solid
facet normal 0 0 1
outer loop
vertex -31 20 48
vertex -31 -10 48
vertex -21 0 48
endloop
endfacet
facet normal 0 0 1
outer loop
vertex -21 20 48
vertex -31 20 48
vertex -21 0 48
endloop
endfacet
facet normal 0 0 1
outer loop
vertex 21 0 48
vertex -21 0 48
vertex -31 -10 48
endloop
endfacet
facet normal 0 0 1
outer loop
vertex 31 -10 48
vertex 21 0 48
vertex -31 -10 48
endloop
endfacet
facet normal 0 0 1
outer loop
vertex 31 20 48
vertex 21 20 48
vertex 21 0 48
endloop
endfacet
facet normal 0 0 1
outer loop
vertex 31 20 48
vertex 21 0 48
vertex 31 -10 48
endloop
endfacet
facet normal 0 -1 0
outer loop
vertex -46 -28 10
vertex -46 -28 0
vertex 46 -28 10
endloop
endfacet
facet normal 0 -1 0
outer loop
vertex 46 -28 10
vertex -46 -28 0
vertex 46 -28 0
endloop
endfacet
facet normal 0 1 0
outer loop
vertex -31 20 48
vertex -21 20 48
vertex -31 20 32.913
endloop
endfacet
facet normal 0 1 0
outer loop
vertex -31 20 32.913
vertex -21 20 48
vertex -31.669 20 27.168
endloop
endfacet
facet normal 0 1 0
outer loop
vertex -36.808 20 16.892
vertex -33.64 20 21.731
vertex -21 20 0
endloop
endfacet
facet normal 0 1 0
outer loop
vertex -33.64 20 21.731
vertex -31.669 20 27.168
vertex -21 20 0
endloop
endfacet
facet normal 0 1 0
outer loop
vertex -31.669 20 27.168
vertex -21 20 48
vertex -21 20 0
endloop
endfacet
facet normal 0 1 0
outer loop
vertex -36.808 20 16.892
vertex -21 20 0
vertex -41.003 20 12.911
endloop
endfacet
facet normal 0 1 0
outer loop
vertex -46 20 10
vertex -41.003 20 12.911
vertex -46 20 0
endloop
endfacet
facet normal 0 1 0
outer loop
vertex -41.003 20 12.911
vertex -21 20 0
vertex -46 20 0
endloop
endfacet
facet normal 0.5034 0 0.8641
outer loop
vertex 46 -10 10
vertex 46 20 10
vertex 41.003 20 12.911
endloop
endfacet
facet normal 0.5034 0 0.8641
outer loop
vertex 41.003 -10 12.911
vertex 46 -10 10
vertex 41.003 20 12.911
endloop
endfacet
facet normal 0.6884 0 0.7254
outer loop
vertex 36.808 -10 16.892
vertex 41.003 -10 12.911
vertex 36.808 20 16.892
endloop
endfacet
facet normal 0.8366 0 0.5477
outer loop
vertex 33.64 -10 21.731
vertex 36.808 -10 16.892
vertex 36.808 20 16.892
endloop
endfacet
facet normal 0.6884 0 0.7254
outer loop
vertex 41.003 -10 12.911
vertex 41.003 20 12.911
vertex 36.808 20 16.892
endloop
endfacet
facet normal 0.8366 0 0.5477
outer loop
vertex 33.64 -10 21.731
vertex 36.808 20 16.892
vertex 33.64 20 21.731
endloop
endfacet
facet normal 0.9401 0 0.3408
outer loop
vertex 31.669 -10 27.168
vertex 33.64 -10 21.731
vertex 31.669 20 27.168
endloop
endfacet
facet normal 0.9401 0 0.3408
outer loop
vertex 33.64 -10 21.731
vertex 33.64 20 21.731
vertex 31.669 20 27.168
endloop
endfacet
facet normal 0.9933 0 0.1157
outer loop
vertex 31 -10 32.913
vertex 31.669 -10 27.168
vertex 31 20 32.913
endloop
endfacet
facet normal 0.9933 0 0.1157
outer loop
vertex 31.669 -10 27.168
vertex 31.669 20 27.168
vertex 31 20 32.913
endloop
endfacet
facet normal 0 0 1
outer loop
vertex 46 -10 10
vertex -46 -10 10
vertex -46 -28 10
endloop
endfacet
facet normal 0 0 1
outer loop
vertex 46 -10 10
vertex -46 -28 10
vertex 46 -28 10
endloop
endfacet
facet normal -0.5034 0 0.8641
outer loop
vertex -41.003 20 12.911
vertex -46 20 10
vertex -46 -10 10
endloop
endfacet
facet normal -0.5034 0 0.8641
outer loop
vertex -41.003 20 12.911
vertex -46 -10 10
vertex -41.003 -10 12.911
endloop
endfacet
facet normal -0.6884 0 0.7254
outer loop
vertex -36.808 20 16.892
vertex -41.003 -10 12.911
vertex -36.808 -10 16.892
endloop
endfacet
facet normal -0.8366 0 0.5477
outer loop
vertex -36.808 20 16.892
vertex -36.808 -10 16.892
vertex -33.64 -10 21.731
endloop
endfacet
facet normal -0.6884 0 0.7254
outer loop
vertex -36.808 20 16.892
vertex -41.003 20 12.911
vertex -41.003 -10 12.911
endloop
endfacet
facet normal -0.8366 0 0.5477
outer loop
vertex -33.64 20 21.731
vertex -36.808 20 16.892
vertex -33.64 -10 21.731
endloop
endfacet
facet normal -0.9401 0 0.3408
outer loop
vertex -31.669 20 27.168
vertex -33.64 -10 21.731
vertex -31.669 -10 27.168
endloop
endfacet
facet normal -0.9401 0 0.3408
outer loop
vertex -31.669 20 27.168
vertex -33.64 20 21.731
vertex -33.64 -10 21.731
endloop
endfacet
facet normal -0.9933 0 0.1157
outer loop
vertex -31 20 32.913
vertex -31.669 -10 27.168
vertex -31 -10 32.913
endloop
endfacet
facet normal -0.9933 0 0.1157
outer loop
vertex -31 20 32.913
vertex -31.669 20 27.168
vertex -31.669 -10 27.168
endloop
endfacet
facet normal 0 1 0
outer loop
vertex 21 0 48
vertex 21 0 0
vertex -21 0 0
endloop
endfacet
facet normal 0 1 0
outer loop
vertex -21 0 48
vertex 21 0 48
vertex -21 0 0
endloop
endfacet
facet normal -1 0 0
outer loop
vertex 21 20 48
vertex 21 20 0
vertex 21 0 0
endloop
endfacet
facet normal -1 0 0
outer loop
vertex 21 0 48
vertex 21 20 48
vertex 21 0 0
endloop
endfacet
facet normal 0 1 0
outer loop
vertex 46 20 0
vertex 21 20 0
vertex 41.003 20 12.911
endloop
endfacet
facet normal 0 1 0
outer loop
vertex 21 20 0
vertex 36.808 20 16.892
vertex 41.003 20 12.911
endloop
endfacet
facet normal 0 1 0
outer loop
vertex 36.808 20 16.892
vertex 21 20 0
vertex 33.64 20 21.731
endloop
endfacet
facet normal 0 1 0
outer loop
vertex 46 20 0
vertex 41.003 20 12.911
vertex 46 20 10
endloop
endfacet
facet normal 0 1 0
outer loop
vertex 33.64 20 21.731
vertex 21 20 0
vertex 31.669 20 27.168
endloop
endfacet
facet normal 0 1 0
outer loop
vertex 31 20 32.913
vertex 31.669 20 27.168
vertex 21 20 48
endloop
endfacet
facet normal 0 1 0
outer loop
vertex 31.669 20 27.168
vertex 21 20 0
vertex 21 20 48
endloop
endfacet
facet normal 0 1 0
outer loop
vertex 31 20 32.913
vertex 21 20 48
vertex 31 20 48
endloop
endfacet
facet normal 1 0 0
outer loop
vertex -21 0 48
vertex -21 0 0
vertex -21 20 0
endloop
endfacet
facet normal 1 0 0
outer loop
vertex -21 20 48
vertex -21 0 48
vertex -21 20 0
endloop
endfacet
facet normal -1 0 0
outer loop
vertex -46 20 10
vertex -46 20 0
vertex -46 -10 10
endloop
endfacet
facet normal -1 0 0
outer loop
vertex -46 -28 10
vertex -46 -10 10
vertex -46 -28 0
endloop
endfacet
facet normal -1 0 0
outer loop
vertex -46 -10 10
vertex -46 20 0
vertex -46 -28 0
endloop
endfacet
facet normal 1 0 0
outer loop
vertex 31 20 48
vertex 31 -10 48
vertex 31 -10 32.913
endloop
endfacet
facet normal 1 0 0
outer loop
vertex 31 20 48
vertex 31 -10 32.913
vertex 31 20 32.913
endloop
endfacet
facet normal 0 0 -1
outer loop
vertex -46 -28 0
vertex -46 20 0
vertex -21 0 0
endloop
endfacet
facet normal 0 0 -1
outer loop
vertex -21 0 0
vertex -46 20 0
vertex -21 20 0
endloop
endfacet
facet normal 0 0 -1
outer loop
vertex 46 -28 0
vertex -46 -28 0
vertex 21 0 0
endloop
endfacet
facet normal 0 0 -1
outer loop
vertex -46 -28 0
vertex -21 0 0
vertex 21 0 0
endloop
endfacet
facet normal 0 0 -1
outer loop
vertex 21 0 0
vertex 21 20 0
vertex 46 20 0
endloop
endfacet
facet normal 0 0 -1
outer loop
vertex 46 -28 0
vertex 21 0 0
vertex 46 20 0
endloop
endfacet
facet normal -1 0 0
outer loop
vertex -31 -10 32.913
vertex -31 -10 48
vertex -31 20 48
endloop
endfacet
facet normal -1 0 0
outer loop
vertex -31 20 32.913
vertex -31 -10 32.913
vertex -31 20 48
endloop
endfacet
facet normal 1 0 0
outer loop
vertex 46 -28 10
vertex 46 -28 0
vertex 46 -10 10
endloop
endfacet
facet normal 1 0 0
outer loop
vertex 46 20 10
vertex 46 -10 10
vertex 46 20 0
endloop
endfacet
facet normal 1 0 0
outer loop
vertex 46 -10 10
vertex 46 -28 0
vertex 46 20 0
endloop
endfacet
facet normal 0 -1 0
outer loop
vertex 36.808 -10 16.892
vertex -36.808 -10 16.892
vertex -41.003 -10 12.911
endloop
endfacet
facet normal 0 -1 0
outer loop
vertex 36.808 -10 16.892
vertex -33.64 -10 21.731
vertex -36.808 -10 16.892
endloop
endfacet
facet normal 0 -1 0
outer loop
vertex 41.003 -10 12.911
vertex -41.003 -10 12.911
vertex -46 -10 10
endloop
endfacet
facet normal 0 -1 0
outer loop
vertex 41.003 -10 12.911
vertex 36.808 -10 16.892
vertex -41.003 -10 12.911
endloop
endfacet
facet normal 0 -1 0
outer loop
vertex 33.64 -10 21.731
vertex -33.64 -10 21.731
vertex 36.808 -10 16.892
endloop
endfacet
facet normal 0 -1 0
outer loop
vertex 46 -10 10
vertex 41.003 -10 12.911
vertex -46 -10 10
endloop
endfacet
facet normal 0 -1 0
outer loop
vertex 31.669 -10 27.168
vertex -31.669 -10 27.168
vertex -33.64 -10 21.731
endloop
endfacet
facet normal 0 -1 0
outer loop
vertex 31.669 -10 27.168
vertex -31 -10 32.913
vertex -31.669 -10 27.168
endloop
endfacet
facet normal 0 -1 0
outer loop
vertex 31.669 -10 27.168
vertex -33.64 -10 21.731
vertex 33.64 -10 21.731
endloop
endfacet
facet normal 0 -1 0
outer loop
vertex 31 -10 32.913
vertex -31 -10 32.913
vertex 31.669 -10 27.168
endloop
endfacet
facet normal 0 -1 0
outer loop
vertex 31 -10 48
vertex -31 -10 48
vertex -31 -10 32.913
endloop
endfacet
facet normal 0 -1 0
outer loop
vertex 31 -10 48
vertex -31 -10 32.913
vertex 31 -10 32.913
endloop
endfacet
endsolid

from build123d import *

# Parameters (mm, degrees)
F0_W        = 15
F0_H        = 30
F1_DEPTH    = 48
F2_DEPTH    = 10
F3_W        = 15
F3_H        = 30
F4_DEPTH    = 38
F5_T1_DEPTH = 30


# Not quite as in the source:
# - a fillet or chamfer that OpenCascade refuses, or shapes differently, is made with other operations: its cross-section is extruded or revolved along the edge and cut away or added


with BuildPart() as f1:
    # F0 (on Top) → F1 (new body)
    with BuildSketch(Plane.XY):
        Polygon((21, 0), (0, 0), (-21, 0), (-21, 20), (-31, 20), (-31, -10), (31, -10), (31, 20), (21, 20), align=None)
        with Locations((38.5, 5)):
            Rectangle(F0_W, F0_H)
        with Locations((-38.5, 5)):
            Rectangle(F0_W, F0_H)
    extrude(amount=F1_DEPTH)

    # F0 (on Top) → F2 (join)
    with BuildSketch(Plane.XY):
        Polygon((46, -10), (31, -10), (-31, -10), (-46, -10), (-46, -28), (46, -28), align=None)
    extrude(amount=F2_DEPTH)

    # F3 (on face) → F4 (cut)
    with BuildSketch(Plane.XY.offset(48)):
        with Locations((-38.5, 5)):
            Rectangle(F3_W, F3_H)
        with Locations((38.5, 5)):
            Rectangle(F3_W, F3_H)
    extrude(amount=-F4_DEPTH, mode=Mode.SUBTRACT)

    # F5: fillet of radius 25 on 2 edges, made by hand

    # F5_s2 → F5_t1 (join)
    with BuildSketch(Plane.XZ.offset(-20)):
        with BuildLine():
            ThreePointArc((46, 10), (35.0834993366, 19.2198145372), (31, 32.9128784748))
            Line((31, 32.9128784748), (31, 10))
            Line((31, 10), (46, 10))
        make_face()
        with BuildLine():
            ThreePointArc((-46, 10), (-35.0834993366, 19.2198145372), (-31, 32.9128784748))
            Line((-31, 32.9128784748), (-31, 10))
            Line((-31, 10), (-46, 10))
        make_face()
    extrude(amount=F5_T1_DEPTH)


solid = f1.part
